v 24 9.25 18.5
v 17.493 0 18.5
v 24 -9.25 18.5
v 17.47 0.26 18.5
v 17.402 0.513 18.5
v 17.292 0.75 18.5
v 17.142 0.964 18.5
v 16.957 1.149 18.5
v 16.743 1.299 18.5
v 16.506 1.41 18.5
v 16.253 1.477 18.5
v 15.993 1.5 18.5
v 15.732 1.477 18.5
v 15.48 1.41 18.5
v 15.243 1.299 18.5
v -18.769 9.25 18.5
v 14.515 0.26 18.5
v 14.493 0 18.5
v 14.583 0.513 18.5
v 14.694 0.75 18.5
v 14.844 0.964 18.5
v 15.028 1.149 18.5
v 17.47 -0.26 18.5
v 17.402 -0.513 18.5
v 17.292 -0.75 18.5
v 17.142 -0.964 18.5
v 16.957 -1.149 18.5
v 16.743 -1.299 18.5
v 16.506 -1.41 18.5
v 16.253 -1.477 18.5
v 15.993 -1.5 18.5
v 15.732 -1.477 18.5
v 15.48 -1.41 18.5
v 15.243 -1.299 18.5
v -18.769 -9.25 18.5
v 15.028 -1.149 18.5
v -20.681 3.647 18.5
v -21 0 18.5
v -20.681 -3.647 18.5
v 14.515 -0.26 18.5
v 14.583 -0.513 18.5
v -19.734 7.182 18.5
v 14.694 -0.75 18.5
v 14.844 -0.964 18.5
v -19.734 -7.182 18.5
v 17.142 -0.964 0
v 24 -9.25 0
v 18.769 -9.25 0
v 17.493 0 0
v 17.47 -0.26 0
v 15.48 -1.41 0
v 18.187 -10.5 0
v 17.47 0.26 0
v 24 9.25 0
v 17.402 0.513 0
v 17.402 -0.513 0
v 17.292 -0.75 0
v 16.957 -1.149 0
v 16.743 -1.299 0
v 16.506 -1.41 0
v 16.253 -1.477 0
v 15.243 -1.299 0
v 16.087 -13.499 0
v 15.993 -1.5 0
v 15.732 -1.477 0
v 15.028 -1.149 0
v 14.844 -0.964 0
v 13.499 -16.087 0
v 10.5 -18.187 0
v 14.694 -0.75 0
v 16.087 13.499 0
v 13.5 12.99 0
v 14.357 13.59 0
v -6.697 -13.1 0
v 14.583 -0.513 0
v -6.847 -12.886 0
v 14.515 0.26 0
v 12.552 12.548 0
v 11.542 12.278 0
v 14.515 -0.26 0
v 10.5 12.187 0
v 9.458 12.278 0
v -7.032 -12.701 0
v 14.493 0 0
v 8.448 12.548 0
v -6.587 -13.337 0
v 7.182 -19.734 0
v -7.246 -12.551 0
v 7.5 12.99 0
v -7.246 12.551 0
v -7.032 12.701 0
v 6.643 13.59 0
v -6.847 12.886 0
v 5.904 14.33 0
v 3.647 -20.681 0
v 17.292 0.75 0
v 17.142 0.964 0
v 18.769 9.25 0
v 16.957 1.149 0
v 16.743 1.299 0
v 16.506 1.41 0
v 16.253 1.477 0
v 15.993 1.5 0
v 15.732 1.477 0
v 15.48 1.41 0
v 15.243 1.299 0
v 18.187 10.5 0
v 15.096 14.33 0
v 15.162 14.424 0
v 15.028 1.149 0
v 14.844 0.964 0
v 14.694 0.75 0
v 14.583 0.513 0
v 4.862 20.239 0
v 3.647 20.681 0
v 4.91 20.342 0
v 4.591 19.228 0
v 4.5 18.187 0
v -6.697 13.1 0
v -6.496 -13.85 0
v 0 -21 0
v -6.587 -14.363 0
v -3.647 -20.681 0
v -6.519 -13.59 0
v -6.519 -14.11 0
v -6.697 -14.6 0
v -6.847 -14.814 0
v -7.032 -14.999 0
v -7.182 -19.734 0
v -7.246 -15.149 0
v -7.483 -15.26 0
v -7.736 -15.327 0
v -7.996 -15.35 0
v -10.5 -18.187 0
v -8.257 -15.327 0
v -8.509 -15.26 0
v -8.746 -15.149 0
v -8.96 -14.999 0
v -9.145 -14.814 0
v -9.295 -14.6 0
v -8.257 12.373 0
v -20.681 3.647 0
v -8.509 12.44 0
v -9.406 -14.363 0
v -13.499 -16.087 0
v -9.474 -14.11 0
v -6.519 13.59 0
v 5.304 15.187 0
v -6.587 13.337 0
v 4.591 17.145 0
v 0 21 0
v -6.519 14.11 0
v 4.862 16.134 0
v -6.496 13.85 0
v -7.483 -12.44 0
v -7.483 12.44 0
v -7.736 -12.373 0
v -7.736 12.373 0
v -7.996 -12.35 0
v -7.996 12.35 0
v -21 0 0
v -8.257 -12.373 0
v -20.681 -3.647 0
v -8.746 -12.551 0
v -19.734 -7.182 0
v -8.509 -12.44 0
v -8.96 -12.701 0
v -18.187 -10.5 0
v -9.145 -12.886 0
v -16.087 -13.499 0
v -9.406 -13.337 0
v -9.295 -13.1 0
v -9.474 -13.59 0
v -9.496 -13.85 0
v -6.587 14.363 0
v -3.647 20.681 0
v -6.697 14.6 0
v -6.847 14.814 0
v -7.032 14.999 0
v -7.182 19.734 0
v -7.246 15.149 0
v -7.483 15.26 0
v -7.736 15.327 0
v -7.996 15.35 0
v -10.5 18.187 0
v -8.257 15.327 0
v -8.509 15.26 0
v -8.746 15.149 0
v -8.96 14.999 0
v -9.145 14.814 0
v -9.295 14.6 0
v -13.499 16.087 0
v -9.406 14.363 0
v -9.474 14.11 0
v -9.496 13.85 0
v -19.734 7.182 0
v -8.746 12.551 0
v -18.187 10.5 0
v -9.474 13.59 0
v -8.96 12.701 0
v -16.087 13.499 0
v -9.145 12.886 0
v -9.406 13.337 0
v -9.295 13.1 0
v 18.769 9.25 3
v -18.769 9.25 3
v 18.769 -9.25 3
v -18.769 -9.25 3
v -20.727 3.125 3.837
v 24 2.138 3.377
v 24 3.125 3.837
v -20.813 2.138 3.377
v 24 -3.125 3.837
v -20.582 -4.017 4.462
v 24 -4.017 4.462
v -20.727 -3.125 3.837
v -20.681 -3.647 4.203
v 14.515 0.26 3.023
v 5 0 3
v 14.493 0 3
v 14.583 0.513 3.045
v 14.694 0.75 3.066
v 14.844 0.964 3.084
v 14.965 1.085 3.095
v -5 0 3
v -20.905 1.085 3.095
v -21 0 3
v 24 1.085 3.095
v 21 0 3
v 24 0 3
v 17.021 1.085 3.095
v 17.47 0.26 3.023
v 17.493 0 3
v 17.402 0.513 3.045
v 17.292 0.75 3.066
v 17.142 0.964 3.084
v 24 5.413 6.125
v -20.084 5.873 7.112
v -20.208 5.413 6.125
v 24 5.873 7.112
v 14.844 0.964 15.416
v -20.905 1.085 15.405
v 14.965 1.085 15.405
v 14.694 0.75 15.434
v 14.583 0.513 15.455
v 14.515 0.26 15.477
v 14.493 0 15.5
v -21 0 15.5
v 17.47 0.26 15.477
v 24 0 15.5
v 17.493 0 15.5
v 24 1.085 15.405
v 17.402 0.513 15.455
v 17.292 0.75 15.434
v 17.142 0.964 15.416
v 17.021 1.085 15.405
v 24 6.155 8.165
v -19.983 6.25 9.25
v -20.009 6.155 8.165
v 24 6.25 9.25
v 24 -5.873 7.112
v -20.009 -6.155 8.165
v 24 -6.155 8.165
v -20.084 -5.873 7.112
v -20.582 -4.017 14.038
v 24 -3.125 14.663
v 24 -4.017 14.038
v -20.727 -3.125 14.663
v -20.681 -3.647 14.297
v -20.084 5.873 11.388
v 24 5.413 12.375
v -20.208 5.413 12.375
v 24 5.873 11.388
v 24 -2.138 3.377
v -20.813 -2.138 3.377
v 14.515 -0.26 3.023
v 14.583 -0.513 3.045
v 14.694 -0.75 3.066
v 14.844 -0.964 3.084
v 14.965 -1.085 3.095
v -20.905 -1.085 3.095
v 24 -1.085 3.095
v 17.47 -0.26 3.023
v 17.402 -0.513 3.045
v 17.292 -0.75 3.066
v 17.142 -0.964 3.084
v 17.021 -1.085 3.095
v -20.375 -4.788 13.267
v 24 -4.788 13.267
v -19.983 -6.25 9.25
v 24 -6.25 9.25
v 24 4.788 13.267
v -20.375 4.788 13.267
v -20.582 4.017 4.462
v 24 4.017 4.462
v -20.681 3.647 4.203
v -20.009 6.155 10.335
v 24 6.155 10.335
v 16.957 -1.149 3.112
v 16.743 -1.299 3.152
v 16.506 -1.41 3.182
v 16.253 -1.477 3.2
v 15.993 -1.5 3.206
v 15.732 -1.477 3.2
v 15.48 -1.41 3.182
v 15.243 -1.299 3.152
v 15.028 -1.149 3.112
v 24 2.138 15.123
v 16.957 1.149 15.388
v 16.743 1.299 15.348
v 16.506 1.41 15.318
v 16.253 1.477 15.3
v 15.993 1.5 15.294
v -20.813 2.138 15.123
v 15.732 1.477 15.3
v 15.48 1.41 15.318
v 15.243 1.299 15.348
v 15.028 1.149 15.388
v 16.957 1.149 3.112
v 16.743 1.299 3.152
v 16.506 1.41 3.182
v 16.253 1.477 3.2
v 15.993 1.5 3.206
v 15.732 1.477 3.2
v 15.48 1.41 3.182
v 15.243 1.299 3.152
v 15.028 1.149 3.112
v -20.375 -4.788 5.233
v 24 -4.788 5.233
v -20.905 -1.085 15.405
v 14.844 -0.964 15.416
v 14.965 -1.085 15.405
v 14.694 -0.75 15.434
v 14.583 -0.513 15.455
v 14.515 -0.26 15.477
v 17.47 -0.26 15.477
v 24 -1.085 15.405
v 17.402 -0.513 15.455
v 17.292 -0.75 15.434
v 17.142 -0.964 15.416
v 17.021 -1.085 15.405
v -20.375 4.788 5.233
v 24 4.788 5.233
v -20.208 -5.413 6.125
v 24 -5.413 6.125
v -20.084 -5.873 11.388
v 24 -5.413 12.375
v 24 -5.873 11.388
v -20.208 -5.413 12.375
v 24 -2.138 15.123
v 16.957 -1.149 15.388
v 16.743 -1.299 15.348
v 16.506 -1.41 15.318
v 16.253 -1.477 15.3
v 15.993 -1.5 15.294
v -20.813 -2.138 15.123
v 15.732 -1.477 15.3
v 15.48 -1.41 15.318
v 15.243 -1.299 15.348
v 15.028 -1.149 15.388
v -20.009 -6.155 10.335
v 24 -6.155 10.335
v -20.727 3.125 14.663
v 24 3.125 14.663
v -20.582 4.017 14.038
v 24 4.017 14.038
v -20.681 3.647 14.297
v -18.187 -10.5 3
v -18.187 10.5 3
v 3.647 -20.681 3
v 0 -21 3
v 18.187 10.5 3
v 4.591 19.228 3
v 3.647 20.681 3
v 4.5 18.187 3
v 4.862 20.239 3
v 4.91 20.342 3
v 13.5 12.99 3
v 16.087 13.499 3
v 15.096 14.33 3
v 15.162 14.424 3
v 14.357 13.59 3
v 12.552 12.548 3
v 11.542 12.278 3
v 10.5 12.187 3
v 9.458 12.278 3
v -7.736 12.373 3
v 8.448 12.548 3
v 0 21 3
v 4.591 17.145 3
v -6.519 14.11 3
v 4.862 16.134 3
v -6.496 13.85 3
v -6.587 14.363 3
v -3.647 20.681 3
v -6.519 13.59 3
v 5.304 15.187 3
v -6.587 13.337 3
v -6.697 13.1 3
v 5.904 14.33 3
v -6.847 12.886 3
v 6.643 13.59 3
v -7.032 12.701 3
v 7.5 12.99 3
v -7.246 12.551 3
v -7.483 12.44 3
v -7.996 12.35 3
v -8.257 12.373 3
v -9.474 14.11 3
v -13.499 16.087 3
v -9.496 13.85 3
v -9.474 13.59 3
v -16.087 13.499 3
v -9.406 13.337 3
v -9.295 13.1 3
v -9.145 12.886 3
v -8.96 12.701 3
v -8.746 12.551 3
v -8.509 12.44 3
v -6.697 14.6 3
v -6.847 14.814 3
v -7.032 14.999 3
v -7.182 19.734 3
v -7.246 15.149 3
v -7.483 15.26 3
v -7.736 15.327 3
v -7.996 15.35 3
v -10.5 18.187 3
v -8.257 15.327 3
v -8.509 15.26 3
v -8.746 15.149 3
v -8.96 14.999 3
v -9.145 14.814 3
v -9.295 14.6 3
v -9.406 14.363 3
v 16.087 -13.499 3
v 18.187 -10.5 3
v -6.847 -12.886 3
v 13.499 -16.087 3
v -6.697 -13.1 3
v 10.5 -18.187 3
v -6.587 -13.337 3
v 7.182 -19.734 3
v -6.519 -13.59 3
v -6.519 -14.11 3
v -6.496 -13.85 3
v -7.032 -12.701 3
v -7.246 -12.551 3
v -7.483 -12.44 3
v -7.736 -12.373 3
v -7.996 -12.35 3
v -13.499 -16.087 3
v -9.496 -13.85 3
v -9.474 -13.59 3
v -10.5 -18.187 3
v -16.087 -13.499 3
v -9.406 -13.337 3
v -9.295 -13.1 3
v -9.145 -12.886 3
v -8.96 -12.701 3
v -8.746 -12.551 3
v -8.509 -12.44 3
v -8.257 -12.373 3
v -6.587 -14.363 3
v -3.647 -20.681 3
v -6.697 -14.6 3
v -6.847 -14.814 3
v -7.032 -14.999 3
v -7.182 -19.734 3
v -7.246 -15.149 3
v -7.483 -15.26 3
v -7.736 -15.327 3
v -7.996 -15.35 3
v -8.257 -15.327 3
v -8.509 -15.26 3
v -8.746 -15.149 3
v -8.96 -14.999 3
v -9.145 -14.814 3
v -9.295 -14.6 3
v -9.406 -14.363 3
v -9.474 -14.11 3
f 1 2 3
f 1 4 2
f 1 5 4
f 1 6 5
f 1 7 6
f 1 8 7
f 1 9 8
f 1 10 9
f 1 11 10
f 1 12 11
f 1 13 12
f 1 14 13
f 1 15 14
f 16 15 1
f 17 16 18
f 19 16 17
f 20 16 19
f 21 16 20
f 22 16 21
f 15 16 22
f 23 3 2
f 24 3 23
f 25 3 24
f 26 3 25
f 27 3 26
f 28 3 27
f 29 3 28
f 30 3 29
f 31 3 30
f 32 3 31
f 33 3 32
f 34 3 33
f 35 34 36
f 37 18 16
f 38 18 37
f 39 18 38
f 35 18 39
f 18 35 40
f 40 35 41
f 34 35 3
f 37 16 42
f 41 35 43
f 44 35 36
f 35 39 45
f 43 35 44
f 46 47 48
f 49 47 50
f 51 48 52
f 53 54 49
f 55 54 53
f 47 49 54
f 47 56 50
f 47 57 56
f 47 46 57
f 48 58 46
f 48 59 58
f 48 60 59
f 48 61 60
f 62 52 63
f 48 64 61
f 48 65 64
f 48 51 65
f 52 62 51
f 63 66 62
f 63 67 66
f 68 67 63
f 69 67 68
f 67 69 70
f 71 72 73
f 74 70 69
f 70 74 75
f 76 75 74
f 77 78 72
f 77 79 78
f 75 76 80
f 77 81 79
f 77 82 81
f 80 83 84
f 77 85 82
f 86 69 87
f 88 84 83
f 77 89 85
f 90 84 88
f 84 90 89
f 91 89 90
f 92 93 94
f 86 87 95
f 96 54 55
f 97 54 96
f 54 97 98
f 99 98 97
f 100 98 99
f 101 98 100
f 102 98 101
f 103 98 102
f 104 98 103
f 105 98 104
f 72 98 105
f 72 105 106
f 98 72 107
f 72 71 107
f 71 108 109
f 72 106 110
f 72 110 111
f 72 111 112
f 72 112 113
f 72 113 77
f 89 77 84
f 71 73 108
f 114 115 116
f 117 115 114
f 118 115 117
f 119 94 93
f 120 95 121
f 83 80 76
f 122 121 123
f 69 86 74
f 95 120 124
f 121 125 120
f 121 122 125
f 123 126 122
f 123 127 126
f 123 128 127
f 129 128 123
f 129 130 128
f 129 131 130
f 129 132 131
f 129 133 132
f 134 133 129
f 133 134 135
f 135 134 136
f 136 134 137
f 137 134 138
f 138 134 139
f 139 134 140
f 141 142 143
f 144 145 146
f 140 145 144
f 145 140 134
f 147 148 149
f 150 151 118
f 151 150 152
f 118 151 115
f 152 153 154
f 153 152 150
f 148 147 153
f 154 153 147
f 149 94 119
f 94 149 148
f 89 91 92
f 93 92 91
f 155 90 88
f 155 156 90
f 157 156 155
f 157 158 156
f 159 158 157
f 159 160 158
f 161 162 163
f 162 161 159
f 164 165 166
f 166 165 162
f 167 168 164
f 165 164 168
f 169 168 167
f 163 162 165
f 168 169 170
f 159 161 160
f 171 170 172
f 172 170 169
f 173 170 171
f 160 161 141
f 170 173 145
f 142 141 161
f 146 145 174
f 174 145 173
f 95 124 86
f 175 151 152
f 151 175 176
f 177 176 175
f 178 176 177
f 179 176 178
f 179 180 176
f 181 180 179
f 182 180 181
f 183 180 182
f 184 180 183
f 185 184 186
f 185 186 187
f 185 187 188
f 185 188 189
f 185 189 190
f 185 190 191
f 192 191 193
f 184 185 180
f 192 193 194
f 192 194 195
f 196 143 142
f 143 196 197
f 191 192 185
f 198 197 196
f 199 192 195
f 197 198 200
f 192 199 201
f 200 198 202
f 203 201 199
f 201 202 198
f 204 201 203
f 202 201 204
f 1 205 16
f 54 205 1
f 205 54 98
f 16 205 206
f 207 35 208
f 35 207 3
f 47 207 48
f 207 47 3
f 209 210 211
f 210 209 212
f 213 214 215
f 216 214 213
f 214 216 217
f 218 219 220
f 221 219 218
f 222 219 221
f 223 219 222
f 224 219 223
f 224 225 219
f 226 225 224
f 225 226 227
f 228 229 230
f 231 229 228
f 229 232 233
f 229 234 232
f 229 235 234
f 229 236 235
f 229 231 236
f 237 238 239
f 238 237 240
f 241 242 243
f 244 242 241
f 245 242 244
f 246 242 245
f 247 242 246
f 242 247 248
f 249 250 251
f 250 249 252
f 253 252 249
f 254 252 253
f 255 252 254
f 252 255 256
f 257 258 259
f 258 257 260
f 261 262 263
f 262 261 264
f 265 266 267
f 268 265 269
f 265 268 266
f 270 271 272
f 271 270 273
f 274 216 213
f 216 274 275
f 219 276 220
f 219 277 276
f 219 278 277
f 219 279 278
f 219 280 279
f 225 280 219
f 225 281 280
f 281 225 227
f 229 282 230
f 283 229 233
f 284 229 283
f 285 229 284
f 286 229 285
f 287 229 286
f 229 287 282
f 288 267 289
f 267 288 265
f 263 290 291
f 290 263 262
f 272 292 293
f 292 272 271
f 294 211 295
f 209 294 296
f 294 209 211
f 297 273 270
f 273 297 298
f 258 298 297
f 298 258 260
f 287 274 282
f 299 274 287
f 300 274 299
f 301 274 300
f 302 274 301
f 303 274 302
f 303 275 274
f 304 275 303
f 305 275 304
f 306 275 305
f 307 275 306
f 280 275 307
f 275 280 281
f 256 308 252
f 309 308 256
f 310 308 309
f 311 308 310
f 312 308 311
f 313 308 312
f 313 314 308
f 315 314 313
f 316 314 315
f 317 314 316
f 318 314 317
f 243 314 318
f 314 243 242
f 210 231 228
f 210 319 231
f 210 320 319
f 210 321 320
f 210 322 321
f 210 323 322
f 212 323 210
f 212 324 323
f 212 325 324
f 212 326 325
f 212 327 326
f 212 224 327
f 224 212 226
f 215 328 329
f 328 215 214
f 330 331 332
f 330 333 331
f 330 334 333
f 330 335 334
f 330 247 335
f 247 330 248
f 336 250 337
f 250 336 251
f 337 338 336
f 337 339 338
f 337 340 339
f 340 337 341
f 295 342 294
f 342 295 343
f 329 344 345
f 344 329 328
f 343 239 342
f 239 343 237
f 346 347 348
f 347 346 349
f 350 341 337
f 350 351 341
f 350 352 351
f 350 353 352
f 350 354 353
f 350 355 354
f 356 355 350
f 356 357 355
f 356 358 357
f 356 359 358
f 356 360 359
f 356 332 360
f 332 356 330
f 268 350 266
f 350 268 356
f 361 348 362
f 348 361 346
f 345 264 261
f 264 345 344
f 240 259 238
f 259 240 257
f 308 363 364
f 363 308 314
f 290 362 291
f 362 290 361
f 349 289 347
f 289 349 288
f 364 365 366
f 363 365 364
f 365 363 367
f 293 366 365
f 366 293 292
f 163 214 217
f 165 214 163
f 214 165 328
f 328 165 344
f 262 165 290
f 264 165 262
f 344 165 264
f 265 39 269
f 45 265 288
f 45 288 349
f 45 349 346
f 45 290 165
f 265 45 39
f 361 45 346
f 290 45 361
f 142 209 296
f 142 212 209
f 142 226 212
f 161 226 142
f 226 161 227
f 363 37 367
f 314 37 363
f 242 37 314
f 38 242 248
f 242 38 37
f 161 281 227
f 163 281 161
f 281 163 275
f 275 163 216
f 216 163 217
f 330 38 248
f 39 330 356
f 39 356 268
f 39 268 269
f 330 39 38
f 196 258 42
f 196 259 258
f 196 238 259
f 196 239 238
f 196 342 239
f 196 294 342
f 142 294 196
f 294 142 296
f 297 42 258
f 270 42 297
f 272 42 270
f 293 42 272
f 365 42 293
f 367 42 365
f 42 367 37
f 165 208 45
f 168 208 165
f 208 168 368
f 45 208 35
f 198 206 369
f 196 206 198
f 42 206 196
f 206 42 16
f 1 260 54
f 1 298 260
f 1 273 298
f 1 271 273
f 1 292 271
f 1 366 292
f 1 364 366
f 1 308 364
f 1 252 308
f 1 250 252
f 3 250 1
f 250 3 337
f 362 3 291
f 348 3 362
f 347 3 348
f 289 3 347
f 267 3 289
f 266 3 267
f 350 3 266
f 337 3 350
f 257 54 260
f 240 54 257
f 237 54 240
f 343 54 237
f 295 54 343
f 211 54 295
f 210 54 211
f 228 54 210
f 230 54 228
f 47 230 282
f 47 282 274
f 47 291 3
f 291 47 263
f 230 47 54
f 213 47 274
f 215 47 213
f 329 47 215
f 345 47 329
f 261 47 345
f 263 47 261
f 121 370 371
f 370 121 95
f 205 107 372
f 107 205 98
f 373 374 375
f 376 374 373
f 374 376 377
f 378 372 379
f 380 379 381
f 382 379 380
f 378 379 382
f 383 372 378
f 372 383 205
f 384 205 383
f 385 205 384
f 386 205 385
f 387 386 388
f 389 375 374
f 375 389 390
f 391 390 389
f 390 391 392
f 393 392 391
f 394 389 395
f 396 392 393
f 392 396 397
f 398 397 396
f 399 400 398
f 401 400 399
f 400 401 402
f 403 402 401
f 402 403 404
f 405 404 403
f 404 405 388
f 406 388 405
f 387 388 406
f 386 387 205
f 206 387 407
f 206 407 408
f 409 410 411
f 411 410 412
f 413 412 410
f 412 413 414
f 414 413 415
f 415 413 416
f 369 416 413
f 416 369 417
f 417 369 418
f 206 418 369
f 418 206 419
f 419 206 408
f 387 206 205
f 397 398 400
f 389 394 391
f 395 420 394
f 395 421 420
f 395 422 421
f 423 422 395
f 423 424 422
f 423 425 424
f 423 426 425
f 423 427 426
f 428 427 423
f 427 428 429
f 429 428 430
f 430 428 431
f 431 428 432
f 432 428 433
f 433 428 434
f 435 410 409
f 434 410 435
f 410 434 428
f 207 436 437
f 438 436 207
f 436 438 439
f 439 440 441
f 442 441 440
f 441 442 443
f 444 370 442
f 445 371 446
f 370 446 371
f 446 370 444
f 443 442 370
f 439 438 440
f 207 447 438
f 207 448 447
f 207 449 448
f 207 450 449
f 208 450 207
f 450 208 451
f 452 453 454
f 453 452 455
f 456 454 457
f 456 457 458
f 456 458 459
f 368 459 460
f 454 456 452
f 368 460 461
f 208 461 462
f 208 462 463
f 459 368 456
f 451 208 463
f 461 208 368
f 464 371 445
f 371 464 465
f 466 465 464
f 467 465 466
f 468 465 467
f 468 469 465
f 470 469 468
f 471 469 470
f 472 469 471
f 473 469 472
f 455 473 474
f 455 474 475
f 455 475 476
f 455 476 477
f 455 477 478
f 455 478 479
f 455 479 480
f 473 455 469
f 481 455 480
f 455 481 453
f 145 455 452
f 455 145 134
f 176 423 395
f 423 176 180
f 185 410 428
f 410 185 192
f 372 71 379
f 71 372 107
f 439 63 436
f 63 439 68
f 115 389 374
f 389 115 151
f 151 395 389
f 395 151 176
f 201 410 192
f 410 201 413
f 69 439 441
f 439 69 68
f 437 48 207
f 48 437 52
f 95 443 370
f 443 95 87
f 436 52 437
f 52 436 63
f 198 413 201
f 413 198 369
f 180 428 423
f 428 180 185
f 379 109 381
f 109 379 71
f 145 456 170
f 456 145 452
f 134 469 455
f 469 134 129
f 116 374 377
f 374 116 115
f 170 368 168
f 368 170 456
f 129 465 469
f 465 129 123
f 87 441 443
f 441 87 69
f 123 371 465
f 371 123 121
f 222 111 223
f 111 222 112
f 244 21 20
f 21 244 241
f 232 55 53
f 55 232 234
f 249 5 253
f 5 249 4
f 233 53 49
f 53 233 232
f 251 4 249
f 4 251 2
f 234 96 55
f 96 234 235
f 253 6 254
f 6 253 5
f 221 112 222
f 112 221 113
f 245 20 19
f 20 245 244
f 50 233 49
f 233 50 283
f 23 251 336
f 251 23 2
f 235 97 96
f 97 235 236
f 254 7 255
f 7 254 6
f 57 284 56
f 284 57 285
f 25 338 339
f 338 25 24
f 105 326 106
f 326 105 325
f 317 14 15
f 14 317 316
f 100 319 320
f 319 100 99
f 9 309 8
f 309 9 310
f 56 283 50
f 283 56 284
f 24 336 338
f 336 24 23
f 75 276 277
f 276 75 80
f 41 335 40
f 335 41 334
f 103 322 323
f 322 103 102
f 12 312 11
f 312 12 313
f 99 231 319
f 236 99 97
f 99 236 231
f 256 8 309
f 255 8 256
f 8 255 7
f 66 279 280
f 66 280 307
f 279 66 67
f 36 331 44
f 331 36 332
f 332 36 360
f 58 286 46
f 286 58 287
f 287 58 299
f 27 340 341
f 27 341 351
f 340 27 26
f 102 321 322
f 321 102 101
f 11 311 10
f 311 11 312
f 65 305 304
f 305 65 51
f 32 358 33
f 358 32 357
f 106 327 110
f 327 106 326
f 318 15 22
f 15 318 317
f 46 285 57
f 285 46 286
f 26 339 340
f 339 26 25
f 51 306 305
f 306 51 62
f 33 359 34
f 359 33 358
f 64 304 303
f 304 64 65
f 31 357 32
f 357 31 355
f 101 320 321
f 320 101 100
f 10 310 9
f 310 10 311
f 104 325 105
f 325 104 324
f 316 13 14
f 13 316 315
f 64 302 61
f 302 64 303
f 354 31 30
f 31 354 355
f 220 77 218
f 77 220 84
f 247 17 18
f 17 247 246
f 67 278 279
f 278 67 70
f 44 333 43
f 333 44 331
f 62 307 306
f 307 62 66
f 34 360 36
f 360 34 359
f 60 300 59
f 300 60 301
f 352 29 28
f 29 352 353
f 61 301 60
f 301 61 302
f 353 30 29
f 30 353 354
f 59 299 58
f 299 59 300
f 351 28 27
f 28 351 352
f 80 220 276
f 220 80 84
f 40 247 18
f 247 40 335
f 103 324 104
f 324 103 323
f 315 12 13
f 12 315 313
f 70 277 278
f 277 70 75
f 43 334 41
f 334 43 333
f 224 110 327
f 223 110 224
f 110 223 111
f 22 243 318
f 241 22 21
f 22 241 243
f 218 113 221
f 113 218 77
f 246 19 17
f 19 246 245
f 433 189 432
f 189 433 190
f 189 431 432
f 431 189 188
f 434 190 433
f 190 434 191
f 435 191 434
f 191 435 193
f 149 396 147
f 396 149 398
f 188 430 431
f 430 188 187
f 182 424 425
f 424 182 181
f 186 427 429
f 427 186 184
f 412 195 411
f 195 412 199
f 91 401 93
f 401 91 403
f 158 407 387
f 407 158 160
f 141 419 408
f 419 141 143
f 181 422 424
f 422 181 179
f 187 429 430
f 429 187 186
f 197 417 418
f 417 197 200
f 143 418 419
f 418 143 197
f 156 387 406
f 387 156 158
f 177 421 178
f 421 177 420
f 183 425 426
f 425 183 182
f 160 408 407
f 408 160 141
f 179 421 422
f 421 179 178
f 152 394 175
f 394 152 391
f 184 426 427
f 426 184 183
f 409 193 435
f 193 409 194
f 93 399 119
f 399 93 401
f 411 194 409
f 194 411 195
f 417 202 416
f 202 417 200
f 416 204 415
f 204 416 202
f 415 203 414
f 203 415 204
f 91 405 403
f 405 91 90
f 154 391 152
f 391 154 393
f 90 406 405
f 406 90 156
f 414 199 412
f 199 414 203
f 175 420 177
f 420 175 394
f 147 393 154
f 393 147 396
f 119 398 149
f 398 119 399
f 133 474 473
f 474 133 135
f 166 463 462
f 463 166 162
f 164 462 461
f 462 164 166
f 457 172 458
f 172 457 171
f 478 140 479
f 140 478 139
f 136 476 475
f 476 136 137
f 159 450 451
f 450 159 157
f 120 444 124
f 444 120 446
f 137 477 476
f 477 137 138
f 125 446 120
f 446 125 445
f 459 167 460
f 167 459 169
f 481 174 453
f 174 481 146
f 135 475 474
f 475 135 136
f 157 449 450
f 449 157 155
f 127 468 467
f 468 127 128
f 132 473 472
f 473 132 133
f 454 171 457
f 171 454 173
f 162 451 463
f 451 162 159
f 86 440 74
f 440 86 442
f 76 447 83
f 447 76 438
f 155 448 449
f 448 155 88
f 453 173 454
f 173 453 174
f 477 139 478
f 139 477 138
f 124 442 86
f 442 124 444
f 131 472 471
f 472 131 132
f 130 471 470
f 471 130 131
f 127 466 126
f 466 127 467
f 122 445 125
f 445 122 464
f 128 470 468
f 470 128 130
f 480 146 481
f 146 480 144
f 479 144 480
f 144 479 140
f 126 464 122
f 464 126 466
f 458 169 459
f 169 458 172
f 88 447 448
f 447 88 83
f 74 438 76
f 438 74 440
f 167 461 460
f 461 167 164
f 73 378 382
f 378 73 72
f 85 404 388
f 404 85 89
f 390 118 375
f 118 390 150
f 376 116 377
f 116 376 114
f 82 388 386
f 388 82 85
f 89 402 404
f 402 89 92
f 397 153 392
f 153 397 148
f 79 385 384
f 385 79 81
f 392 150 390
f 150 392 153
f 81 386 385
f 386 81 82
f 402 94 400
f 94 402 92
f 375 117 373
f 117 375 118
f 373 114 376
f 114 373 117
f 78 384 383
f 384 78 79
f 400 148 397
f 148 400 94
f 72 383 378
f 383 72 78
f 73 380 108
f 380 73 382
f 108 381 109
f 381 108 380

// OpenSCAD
$fn=36;

/************************************************
	База - круглая шайба с углублением в центре.
*************************************************/

base_D = 42; // большой диаметр шайбы 
base_H = 3; // высота (толщина) шайбы
base_center_hole_D = 10; // диаметр центрального углубления
base_center_hole_H = 3; // глубина центрального углубления 

module base () {
	difference() {
		cylinder(d=base_D, h=base_H, center=true);
		cylinder(d=base_center_hole_D, h=base_center_hole_H, center=true);
	}
}
//base();

/************************************************
	Отверстие для крепления с фаской.
*************************************************/

mount_hole_D = 3; // диаметр отверстия 
mount_hole_had_D = 6; // диаметр фаски

/*
module mount_hole (H,h) {
	union() {
		cylinder(d=mount_hole_D, h=H, center=true);
		translate([0,0,h]) { cylinder(d=mount_hole_had_D, h=H, center=true); }		
	}
}
*/
//mount_hole(20, 3);

module mount_hole (H,h) {
	union() {
		cylinder(d=mount_hole_D, h=H, center=true);	
	}
}

/************************************************
	Ухо - выступающее крепление.
*************************************************/

ear_D = 15; // ширина
ear_H = base_H; // высота (толщина)
ear_hole_D = 3; // диаметр отверстия

module ear () {
	difference() {
		union() {
			cylinder(d=ear_D, h=ear_H, center=true);
			translate([ear_D/2, 0,0]) { cube([ear_D, ear_D, ear_H], center=true); }
		}
		cylinder(d=ear_hole_D, h=ear_H+1, center=true);
	}
}
//ear();

/************************************************
	Выступающая часть для крепления трубы.
*************************************************/

tube_D = 12.5; // диаметр трубы
tube_mount_W = tube_D + 3*2; // ширина крепления для трубы (выступает с двух сторон на 2 миллиметра - поэтому "+ 2*2")
tube_mount_A = 0; // угол наклона трубы к горизонтальной плоскости

module tube_mount () {
	intersection() {
		difference() {
			translate([0,0,tube_D/4])
				cube([base_D*2, tube_mount_W, tube_mount_W], center=true);
			translate([-base_D/2,0,0]) rotate([0,-tube_mount_A,0]) translate([base_D/2,0,0]) {
				translate([0,0,tube_D/4]) {
					rotate([0,90,0]) { 
						cylinder(d=tube_D, h=base_D*2, center=true);
					}
				}
			}
		}
		union() {
			cylinder(d=base_D, h=tube_D*2, center=true);
			translate([3,0,tube_D/4])
				cube([base_D, tube_mount_W, tube_mount_W], center=true);
		}
	}
}
//tube_mount();


/************************************************
	А теперь - само крепление мотора.
*************************************************/

tube_mount_position_A = 0; // угол поворота крепления трубы относительно остальных элементов

ear_hole_position_R = 25; // расстояние от центра до отверстия в ухе
ear_position_A = 0; // угол поворота ушей относительно остальных элементов

mount_A = 27.7;
mount_hole_position_R = mount_A/2/cos(30); // расстояние от центра до отверстия для крепления
mount_hole_number = 3; // количество отверстий
mount_hole_position_A = 0; // угол поворота всех отверстий относительно остальных элементов



difference() {
	union() {
		rotate([0,0,tube_mount_position_A]) 
		translate([0,0,tube_D/4+base_H]) 
		{ 
			tube_mount();	
		}
		
		translate([0,0,base_H/2]) { base(); }
/*		
		rotate([0,0, ear_position_A]) 
		union() {
			translate([-ear_hole_position_R, 0, ear_H/2]) { ear(); }
			mirror([1,0,0]) { translate([-ear_hole_position_R, 0, ear_H/2]) { ear(); } }
		}
*/
	}
	union() {
		for (i = [0 : mount_hole_number-1])
		{
			rotate([0,0, mount_hole_position_A + 360/mount_hole_number*i]) 
			translate([mount_hole_position_R, 0, tube_D]) 
			{ 
				mount_hole(tube_D*2, base_H); 
			}
		}
		rotate([0,0,60])
		translate([base_D/2,0,0])
			cylinder(d=12, h=base_H);
	}
}
